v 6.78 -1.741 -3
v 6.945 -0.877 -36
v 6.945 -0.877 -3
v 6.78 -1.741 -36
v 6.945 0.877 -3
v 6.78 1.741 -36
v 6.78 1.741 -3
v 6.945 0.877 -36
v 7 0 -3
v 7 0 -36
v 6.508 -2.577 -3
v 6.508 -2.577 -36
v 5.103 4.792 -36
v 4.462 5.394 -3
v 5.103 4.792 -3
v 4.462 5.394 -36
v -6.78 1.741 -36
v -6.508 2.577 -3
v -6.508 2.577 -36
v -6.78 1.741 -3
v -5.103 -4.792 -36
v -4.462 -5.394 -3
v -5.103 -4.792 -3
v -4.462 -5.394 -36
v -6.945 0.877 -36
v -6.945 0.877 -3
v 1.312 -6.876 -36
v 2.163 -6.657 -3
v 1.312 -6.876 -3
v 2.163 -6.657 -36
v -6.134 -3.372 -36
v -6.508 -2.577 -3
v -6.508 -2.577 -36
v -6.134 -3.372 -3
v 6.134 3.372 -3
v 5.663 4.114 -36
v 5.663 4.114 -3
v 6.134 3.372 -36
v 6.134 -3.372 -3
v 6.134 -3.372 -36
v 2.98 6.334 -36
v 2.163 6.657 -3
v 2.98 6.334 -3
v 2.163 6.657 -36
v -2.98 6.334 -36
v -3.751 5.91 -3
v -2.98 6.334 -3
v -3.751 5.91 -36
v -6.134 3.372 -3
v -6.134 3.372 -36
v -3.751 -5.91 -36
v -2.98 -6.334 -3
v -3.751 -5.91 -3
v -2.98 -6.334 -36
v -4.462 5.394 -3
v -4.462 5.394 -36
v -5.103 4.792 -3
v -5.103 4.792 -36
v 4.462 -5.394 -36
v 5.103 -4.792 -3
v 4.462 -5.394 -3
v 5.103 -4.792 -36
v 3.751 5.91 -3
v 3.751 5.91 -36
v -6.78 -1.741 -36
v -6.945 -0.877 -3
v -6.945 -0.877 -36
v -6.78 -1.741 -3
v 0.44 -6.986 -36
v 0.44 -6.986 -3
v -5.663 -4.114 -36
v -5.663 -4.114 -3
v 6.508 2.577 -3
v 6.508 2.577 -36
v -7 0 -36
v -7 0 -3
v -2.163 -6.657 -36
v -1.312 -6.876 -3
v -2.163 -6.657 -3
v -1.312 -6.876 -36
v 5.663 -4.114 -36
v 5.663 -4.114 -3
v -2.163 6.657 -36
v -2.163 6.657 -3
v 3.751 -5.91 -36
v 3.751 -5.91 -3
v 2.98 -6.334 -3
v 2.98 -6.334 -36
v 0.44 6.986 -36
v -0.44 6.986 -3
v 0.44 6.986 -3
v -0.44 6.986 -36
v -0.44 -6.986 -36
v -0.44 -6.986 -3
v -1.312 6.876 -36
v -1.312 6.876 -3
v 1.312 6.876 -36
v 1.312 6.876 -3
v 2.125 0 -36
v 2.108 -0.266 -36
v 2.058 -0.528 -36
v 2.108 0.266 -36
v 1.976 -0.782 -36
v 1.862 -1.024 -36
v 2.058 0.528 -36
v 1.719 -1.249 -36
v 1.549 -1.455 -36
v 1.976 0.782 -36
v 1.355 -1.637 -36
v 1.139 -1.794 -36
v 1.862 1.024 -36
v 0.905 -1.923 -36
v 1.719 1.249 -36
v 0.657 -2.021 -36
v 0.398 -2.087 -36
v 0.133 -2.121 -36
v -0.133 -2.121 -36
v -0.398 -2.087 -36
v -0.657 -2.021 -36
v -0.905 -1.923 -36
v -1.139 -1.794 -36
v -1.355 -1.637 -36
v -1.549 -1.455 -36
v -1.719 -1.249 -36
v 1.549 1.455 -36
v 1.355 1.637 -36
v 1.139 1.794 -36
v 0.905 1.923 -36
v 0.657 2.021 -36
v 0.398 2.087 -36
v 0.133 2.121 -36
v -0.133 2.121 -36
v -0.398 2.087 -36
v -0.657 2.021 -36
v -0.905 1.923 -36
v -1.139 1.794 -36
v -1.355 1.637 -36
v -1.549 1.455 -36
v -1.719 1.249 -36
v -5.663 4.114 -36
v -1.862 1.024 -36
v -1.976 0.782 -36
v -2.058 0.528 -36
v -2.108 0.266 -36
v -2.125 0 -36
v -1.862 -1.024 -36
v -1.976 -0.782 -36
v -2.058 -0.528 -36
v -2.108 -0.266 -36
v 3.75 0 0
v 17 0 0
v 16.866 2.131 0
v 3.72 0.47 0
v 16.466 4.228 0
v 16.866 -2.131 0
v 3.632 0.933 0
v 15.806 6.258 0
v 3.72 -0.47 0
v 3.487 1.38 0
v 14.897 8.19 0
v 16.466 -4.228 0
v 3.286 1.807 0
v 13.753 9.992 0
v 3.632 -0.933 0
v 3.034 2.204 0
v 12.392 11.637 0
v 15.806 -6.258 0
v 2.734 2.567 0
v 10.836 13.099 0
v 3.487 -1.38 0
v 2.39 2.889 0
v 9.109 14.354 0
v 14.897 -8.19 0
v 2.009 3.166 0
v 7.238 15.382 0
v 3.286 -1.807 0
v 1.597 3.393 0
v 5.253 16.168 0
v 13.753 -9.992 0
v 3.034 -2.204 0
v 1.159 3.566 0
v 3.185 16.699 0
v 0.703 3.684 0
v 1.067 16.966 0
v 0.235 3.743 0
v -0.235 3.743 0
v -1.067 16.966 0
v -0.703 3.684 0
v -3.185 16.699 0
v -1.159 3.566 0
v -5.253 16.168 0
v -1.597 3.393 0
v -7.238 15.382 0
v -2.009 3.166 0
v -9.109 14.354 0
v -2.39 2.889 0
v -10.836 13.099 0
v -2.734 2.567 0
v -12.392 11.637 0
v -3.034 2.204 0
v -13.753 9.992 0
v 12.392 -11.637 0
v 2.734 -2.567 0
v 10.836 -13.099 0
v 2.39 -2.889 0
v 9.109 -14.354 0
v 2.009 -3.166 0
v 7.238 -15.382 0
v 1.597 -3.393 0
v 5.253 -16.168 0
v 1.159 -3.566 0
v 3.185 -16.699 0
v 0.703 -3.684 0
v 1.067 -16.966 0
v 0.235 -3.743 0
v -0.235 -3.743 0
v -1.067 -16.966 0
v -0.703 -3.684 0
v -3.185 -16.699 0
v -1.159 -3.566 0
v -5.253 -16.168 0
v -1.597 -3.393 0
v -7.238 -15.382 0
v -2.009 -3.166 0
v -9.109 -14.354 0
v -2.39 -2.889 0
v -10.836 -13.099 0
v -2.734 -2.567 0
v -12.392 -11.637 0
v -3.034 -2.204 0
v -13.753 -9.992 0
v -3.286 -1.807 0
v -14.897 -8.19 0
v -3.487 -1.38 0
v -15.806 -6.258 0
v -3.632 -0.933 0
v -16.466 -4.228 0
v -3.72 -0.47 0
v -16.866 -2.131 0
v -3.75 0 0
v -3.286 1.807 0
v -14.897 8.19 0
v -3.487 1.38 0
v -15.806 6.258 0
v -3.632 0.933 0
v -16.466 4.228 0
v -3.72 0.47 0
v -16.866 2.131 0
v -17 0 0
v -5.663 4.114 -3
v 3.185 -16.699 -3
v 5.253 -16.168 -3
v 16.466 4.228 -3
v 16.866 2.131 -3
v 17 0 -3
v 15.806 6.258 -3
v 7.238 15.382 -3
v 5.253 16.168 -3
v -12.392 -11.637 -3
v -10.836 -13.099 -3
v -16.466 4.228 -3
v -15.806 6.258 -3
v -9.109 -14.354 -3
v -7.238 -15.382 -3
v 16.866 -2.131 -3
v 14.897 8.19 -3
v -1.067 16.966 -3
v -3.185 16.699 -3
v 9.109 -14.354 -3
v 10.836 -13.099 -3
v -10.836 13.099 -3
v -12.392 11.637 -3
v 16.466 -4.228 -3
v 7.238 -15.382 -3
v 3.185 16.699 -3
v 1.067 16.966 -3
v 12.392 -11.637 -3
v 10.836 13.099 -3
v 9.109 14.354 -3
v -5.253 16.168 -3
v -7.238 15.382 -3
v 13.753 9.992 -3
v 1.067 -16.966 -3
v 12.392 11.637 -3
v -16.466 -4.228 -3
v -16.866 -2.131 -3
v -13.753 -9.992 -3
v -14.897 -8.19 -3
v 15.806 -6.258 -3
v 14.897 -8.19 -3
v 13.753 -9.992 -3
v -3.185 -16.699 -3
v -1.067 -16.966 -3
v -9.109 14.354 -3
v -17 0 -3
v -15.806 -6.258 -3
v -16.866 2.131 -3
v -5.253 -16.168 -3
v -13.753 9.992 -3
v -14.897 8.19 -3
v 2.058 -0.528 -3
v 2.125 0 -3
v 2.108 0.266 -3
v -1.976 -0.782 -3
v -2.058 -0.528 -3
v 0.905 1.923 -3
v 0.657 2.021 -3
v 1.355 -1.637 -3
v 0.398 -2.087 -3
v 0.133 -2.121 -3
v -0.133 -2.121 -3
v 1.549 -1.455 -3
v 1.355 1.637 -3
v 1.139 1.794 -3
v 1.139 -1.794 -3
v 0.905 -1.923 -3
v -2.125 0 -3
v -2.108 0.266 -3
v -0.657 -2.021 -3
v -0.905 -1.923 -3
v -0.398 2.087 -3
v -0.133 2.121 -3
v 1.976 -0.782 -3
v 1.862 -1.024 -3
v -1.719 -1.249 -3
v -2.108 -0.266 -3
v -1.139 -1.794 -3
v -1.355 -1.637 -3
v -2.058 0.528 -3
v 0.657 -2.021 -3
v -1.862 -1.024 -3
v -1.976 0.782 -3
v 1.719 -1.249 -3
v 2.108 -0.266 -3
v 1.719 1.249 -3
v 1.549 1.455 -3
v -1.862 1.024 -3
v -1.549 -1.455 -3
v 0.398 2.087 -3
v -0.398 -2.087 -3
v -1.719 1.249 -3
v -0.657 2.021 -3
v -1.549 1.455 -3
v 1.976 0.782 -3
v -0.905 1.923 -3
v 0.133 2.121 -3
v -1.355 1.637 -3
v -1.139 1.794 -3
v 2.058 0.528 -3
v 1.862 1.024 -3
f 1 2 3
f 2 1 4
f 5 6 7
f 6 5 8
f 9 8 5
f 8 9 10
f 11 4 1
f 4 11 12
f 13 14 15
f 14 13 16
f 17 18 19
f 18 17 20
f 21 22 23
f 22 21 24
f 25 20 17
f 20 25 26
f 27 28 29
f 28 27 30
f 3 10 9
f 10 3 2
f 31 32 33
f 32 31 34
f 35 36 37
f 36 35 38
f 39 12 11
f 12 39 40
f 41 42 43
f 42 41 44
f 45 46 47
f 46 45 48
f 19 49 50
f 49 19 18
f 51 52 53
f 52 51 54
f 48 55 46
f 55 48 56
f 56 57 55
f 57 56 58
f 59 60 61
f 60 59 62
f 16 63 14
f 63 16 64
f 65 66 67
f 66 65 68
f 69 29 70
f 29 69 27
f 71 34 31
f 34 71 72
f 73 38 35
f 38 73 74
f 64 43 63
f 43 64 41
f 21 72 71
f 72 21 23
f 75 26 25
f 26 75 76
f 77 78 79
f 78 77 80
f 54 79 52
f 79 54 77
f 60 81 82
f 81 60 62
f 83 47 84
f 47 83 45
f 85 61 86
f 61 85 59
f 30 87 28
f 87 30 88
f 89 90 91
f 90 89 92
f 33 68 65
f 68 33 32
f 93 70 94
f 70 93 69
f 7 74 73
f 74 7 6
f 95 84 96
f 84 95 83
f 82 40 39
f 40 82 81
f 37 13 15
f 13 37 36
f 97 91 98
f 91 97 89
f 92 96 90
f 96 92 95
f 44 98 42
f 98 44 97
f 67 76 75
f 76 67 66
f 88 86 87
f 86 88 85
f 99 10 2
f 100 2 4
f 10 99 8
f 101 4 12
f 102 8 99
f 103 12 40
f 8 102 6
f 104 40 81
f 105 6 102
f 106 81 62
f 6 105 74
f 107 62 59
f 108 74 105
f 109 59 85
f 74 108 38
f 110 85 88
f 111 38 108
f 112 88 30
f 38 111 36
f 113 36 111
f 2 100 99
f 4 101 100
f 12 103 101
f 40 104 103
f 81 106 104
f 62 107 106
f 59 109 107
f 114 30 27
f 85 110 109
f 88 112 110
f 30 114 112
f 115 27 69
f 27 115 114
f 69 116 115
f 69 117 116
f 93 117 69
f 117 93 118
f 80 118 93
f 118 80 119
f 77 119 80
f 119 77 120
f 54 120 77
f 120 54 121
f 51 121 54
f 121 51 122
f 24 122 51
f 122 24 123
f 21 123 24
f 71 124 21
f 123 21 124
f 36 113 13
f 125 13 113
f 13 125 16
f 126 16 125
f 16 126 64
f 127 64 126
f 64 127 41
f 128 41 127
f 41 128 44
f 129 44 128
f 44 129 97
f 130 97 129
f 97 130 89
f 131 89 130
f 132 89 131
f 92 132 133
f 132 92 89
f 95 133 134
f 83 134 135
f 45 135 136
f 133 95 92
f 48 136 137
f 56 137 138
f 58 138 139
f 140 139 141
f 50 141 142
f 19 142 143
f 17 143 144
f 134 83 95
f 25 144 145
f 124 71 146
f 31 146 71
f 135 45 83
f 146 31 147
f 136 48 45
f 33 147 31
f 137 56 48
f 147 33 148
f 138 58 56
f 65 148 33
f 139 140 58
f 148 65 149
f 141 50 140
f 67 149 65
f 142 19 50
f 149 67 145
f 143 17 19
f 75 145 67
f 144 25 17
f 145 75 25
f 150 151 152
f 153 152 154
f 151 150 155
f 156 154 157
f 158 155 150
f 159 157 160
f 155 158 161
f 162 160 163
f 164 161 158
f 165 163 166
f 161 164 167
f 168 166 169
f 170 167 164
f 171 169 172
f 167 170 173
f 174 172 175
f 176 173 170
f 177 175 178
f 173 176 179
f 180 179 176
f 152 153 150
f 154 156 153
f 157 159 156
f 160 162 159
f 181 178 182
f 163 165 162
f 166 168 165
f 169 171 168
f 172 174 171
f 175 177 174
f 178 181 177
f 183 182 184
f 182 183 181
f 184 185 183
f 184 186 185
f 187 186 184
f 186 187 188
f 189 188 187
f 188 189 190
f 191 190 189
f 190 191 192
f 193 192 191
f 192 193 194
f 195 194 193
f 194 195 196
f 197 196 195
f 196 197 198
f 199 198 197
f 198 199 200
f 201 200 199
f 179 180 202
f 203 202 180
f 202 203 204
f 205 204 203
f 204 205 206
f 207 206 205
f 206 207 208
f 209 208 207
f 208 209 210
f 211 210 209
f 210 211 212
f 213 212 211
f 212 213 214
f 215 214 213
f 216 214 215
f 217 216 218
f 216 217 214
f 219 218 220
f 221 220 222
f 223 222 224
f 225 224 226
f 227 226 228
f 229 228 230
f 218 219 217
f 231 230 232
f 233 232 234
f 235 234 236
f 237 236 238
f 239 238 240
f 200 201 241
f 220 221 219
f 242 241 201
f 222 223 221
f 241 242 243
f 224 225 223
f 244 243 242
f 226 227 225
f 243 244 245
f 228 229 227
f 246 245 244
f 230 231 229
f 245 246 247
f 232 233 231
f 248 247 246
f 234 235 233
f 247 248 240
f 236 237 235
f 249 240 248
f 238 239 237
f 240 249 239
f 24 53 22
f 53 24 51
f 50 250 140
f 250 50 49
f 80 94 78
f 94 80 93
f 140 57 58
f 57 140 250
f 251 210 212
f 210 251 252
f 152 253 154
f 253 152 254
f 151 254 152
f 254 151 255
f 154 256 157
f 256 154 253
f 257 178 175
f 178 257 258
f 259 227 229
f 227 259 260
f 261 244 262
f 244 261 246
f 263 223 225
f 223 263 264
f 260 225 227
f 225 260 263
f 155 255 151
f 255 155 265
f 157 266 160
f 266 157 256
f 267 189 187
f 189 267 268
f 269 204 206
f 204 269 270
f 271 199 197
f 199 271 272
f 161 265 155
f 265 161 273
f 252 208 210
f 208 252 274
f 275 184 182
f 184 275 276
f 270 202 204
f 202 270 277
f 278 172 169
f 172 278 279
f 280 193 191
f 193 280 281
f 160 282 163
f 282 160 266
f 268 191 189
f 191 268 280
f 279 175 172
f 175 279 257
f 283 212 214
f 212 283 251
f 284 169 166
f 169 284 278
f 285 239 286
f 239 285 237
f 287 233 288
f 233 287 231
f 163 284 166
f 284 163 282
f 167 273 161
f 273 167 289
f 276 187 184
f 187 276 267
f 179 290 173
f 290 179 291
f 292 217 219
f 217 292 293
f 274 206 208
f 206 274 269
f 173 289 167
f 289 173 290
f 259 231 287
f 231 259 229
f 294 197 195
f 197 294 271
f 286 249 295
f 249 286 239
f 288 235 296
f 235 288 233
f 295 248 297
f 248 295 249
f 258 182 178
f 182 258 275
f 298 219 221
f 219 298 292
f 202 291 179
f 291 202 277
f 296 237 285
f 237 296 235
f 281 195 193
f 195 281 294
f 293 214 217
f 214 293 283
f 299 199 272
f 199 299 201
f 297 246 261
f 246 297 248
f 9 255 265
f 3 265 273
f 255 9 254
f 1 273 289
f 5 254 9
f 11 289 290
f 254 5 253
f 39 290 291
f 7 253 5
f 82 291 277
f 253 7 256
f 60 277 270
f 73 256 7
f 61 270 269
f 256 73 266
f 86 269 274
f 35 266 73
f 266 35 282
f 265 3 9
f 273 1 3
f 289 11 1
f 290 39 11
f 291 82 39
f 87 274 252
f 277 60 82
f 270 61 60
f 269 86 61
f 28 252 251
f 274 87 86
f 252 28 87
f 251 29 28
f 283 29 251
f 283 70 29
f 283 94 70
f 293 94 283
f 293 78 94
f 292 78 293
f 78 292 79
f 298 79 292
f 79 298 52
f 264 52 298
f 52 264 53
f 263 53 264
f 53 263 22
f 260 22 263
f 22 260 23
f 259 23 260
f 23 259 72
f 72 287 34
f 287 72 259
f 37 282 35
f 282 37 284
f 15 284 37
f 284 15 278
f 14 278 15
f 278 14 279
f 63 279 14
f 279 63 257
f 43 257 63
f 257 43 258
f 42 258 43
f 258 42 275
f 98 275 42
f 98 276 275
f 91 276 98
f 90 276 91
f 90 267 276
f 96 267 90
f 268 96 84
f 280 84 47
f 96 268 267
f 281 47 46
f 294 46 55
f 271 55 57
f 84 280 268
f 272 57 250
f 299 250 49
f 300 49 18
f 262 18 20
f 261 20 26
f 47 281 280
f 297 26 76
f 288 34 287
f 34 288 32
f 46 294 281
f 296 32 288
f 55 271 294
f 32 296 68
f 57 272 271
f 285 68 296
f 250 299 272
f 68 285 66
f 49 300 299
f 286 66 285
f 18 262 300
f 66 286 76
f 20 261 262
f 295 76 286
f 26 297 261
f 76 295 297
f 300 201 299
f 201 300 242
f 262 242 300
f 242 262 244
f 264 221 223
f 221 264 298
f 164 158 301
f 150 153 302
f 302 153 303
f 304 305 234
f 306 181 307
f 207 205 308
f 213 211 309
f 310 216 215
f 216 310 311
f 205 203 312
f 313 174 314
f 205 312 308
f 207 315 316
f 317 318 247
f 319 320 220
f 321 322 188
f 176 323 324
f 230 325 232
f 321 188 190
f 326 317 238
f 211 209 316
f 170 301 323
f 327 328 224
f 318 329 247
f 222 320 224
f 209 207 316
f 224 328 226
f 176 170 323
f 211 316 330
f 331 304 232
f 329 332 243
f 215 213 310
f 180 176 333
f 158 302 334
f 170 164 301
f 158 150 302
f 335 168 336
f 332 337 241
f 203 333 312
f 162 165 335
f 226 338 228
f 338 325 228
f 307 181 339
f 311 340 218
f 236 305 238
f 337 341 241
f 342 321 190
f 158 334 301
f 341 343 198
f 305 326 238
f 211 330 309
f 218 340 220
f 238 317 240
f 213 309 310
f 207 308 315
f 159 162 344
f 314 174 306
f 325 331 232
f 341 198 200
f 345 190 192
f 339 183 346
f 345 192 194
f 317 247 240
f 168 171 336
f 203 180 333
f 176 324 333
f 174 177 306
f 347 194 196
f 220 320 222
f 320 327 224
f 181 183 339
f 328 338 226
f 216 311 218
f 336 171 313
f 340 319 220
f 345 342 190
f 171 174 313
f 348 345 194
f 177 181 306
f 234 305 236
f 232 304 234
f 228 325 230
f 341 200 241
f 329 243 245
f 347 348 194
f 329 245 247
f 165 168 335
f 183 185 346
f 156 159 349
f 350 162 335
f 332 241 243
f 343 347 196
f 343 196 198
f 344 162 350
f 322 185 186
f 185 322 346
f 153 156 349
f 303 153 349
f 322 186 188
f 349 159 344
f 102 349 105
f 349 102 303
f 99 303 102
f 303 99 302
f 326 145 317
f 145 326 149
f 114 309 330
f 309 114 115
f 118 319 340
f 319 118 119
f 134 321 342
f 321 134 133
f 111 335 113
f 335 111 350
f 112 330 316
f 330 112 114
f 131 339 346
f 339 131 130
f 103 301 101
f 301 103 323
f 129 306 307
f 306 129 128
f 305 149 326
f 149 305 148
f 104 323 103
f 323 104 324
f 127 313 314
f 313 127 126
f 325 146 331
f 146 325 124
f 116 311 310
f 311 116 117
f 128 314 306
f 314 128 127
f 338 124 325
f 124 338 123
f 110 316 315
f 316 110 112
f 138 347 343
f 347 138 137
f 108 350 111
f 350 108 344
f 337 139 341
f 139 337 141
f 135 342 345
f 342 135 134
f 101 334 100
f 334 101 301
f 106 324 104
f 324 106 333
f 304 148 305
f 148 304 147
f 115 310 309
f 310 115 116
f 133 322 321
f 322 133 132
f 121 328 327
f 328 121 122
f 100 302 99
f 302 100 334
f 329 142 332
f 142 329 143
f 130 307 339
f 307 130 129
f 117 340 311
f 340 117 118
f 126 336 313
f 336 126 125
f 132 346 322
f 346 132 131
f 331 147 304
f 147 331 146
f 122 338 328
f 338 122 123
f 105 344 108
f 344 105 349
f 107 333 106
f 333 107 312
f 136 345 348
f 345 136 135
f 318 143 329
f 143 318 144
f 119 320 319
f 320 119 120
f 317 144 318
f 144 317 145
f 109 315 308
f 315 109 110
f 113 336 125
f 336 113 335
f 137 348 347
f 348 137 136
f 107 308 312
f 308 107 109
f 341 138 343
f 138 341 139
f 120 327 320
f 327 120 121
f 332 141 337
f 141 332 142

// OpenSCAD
$fn = 50;


difference() {
	union() {
		translate(v = [0, 0, -36.0000000000]) {
			cylinder(h = 36, r = 7.0000000000);
		}
		translate(v = [0, 0, -3.0000000000]) {
			cylinder(h = 3, r = 17.0000000000);
		}
	}
	union() {
		translate(v = [0, 0, 0]) {
			rotate(a = [0, 0, 0]) {
				difference() {
					union() {
						#translate(v = [0, 0, -36.0000000000]) {
							cylinder(h = 36, r = 2.0000000000);
						}
						#translate(v = [0, 0, -3]) {
							cylinder(h = 3, r = 7.0000000000, r1 = 2.1250000000, r2 = 3.7500000000);
						}
						#translate(v = [0, 0, -36.0000000000]) {
							cylinder(h = 36, r = 2.1250000000);
						}
						#translate(v = [0, 0, -36.0000000000]) {
							cylinder(h = 36, r = 2.0000000000);
						}
					}
					union();
				}
			}
		}
	}
}
